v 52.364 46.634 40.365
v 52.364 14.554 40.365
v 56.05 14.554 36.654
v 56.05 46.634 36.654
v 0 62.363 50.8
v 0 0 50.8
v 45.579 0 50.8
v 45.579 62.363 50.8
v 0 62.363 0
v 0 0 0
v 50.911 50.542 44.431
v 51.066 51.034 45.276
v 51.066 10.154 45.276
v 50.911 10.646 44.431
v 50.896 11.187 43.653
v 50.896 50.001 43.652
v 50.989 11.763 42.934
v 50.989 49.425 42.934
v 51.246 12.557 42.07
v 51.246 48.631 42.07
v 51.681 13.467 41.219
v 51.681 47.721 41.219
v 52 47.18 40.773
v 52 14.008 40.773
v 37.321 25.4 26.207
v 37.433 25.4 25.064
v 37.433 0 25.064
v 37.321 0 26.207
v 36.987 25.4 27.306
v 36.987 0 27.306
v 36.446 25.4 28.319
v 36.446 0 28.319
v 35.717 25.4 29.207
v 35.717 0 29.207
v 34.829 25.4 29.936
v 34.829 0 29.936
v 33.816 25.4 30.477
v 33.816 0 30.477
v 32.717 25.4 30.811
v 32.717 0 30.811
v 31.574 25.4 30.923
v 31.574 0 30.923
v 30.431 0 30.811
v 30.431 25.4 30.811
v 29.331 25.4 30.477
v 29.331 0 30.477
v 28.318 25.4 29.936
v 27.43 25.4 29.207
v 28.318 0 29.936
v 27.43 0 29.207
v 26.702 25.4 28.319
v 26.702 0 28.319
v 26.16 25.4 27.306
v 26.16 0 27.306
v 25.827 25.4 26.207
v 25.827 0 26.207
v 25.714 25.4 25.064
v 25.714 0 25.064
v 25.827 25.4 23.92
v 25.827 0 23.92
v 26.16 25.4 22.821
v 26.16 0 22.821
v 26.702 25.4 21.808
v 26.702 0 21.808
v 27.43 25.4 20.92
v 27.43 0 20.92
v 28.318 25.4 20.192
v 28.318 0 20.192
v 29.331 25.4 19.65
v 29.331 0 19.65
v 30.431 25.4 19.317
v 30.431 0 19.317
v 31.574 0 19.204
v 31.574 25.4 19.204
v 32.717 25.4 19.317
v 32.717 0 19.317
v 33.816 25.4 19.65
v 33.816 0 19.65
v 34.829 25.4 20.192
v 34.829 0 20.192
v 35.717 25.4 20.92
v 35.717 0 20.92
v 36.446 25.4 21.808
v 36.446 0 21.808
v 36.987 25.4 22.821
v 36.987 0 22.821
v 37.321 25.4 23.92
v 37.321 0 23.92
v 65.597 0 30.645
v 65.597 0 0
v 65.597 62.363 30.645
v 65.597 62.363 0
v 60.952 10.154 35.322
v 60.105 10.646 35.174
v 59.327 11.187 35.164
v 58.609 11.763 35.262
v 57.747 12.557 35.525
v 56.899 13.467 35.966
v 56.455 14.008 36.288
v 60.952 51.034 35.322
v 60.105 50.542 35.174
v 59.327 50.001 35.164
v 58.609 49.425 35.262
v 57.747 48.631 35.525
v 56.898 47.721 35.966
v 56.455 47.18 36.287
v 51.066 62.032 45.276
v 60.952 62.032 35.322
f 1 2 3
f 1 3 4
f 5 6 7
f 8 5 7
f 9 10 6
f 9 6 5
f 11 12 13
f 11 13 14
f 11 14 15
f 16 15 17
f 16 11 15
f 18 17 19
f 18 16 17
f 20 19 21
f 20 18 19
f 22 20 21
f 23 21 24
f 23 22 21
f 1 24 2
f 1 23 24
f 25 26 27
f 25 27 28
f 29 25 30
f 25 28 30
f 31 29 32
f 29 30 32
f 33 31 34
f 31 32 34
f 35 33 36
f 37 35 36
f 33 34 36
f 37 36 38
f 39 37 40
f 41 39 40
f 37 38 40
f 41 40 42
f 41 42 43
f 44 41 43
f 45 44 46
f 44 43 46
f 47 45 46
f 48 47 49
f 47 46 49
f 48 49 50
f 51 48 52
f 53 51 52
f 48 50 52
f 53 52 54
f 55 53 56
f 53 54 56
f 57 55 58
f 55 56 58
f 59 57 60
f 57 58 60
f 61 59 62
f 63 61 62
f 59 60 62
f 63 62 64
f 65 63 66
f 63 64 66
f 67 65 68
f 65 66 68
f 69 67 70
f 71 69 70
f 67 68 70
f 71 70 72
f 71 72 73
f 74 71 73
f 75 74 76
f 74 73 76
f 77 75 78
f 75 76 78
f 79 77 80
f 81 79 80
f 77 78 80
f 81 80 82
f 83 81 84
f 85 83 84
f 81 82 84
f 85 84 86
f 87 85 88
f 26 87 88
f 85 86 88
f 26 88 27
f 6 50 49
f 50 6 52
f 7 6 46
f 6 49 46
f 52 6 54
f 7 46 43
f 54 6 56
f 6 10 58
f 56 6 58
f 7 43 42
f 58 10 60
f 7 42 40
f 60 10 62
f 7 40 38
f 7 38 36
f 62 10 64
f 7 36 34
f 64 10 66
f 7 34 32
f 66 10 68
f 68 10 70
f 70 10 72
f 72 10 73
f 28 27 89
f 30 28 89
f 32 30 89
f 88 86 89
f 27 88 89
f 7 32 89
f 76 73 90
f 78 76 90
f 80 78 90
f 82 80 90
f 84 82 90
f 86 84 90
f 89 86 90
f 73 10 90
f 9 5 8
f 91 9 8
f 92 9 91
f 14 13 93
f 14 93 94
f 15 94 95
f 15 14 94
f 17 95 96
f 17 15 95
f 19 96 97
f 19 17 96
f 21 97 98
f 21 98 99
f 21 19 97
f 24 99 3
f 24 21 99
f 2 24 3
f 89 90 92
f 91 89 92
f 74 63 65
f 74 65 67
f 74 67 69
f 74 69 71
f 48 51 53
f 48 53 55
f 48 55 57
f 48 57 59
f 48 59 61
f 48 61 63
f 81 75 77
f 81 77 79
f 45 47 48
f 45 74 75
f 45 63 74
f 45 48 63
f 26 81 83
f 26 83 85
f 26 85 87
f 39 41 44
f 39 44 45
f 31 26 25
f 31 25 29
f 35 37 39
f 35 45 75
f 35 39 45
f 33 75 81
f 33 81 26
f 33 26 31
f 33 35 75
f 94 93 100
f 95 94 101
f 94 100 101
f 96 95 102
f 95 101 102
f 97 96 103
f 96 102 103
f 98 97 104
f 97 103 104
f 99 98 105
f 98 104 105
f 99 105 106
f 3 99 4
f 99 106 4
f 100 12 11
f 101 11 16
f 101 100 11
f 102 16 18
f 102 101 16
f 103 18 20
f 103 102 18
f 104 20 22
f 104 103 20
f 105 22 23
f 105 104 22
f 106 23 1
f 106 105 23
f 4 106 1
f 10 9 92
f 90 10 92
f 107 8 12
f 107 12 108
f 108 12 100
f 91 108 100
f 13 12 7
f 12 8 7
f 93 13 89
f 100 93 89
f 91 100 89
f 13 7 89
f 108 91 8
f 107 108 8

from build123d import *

# Parameters (mm, degrees)
F0_W        = 65.5969455838
F0_H        = 62.3628050089
F1_DEPTH    = 50.8
F3_DEPTH    = 101.6
F4_W        = 40.8792179078
F4_H        = 14.0294057783
F5_DEPTH    = 2.54
F6_R        = 5.8595306003
F7_DEPTH    = 25.4
F8_T1_DEPTH = 51.8777405358
F8_T3_DEPTH = 14.0294057783
F8_T5_DEPTH = 14.0294057783


# Not quite as in the source:
# - a fillet or chamfer that OpenCascade refuses, or shapes differently, is made with other operations: its cross-section is extruded or revolved along the edge and cut away or added


with BuildPart() as f1:
    # F0 (on Top) → F1 (new body)
    with BuildSketch(Plane.XY):
        with Locations((32.7984727919, 31.1814025044)):
            Rectangle(F0_W, F0_H)
    extrude(amount=F1_DEPTH)

    # F2 (on face) → F3 (cut)
    with BuildSketch(Plane.XZ):
        Polygon((89.7827520967, 45.4889908433), (33.5367023945, 62.9252642393), (74.5963230729, 21.5844195336), align=None)
    extrude(amount=-F3_DEPTH, mode=Mode.SUBTRACT)

    # F4 (on face) → F5 (cut)
    with BuildSketch(Plane(origin=(48.3447062482, 0, 48.0158379562), x_dir=(0, 1, 0), z_dir=(0.7095159293, 0, 0.7046893969))):
        with Locations((30.5939735845, -10.8757299604)):
            Rectangle(F4_W, F4_H)
    extrude(amount=-F5_DEPTH, mode=Mode.SUBTRACT)

    # F6 (on face) → F7 (cut)
    with BuildSketch(Plane.XZ):
        with Locations((31.5736755729, 25.0635799021)):
            Circle(F6_R)
    extrude(amount=-F7_DEPTH, mode=Mode.SUBTRACT)

    # F8: fillet of radius 5.08 on 4 edges, made by hand

    # F8_s2 → F8_t1 (join)
    with BuildSketch(Plane.XZ.offset(-62.0321051664)):
        with BuildLine():
            ThreePointArc((51.0655310864, 45.2763777457), (51.0565565883, 42.6467915619), (52.3635775369, 40.3650158763))
            Line((52.3635775369, 40.3650158763), (49.263360626, 43.4864666776))
            Line((49.263360626, 43.4864666776), (51.0655310864, 45.2763777457))
        make_face()
        with BuildLine():
            ThreePointArc((60.9519045829, 35.3222908675), (58.3223183991, 35.3312653655), (56.0495172115, 36.6538306007))
            Line((56.0495172115, 36.6538306007), (59.1497341225, 33.5323797994))
            Line((59.1497341225, 33.5323797994), (60.9519045829, 35.3222908675))
        make_face()
    extrude(amount=F8_T1_DEPTH)

    # F8_s4 → F8_t3 (join)
    with BuildSketch(Plane(origin=(12.6071983347, 0, -12.6935470887), x_dir=(0, 1, 0), z_dir=(-0.7046893969, 0, 0.7095159293))):
        with BuildLine():
            ThreePointArc((51.0335825384, -68.1375910703), (49.1741734871, -66.278182019), (46.6341734871, -65.5975910703))
            Line((46.6341734871, -65.5975910703), (51.0335825384, -65.5975910703))
            Line((51.0335825384, -65.5975910703), (51.0335825384, -68.1375910703))
        make_face()
    extrude(amount=F8_T3_DEPTH)

    # F8_s6 → F8_t5 (join)
    with BuildSketch(Plane(origin=(2.7208248382, 0, -2.7394602105), x_dir=(0, 1, 0), z_dir=(0.7046893969, 0, -0.7095159293))):
        with BuildLine():
            ThreePointArc((10.1543646306, 68.1375910703), (12.0137736818, 66.278182019), (14.5537736818, 65.5975910703))
            Line((14.5537736818, 65.5975910703), (10.1543646306, 65.5975910703))
            Line((10.1543646306, 65.5975910703), (10.1543646306, 68.1375910703))
        make_face()
    extrude(amount=F8_T5_DEPTH)


solid = f1.part
